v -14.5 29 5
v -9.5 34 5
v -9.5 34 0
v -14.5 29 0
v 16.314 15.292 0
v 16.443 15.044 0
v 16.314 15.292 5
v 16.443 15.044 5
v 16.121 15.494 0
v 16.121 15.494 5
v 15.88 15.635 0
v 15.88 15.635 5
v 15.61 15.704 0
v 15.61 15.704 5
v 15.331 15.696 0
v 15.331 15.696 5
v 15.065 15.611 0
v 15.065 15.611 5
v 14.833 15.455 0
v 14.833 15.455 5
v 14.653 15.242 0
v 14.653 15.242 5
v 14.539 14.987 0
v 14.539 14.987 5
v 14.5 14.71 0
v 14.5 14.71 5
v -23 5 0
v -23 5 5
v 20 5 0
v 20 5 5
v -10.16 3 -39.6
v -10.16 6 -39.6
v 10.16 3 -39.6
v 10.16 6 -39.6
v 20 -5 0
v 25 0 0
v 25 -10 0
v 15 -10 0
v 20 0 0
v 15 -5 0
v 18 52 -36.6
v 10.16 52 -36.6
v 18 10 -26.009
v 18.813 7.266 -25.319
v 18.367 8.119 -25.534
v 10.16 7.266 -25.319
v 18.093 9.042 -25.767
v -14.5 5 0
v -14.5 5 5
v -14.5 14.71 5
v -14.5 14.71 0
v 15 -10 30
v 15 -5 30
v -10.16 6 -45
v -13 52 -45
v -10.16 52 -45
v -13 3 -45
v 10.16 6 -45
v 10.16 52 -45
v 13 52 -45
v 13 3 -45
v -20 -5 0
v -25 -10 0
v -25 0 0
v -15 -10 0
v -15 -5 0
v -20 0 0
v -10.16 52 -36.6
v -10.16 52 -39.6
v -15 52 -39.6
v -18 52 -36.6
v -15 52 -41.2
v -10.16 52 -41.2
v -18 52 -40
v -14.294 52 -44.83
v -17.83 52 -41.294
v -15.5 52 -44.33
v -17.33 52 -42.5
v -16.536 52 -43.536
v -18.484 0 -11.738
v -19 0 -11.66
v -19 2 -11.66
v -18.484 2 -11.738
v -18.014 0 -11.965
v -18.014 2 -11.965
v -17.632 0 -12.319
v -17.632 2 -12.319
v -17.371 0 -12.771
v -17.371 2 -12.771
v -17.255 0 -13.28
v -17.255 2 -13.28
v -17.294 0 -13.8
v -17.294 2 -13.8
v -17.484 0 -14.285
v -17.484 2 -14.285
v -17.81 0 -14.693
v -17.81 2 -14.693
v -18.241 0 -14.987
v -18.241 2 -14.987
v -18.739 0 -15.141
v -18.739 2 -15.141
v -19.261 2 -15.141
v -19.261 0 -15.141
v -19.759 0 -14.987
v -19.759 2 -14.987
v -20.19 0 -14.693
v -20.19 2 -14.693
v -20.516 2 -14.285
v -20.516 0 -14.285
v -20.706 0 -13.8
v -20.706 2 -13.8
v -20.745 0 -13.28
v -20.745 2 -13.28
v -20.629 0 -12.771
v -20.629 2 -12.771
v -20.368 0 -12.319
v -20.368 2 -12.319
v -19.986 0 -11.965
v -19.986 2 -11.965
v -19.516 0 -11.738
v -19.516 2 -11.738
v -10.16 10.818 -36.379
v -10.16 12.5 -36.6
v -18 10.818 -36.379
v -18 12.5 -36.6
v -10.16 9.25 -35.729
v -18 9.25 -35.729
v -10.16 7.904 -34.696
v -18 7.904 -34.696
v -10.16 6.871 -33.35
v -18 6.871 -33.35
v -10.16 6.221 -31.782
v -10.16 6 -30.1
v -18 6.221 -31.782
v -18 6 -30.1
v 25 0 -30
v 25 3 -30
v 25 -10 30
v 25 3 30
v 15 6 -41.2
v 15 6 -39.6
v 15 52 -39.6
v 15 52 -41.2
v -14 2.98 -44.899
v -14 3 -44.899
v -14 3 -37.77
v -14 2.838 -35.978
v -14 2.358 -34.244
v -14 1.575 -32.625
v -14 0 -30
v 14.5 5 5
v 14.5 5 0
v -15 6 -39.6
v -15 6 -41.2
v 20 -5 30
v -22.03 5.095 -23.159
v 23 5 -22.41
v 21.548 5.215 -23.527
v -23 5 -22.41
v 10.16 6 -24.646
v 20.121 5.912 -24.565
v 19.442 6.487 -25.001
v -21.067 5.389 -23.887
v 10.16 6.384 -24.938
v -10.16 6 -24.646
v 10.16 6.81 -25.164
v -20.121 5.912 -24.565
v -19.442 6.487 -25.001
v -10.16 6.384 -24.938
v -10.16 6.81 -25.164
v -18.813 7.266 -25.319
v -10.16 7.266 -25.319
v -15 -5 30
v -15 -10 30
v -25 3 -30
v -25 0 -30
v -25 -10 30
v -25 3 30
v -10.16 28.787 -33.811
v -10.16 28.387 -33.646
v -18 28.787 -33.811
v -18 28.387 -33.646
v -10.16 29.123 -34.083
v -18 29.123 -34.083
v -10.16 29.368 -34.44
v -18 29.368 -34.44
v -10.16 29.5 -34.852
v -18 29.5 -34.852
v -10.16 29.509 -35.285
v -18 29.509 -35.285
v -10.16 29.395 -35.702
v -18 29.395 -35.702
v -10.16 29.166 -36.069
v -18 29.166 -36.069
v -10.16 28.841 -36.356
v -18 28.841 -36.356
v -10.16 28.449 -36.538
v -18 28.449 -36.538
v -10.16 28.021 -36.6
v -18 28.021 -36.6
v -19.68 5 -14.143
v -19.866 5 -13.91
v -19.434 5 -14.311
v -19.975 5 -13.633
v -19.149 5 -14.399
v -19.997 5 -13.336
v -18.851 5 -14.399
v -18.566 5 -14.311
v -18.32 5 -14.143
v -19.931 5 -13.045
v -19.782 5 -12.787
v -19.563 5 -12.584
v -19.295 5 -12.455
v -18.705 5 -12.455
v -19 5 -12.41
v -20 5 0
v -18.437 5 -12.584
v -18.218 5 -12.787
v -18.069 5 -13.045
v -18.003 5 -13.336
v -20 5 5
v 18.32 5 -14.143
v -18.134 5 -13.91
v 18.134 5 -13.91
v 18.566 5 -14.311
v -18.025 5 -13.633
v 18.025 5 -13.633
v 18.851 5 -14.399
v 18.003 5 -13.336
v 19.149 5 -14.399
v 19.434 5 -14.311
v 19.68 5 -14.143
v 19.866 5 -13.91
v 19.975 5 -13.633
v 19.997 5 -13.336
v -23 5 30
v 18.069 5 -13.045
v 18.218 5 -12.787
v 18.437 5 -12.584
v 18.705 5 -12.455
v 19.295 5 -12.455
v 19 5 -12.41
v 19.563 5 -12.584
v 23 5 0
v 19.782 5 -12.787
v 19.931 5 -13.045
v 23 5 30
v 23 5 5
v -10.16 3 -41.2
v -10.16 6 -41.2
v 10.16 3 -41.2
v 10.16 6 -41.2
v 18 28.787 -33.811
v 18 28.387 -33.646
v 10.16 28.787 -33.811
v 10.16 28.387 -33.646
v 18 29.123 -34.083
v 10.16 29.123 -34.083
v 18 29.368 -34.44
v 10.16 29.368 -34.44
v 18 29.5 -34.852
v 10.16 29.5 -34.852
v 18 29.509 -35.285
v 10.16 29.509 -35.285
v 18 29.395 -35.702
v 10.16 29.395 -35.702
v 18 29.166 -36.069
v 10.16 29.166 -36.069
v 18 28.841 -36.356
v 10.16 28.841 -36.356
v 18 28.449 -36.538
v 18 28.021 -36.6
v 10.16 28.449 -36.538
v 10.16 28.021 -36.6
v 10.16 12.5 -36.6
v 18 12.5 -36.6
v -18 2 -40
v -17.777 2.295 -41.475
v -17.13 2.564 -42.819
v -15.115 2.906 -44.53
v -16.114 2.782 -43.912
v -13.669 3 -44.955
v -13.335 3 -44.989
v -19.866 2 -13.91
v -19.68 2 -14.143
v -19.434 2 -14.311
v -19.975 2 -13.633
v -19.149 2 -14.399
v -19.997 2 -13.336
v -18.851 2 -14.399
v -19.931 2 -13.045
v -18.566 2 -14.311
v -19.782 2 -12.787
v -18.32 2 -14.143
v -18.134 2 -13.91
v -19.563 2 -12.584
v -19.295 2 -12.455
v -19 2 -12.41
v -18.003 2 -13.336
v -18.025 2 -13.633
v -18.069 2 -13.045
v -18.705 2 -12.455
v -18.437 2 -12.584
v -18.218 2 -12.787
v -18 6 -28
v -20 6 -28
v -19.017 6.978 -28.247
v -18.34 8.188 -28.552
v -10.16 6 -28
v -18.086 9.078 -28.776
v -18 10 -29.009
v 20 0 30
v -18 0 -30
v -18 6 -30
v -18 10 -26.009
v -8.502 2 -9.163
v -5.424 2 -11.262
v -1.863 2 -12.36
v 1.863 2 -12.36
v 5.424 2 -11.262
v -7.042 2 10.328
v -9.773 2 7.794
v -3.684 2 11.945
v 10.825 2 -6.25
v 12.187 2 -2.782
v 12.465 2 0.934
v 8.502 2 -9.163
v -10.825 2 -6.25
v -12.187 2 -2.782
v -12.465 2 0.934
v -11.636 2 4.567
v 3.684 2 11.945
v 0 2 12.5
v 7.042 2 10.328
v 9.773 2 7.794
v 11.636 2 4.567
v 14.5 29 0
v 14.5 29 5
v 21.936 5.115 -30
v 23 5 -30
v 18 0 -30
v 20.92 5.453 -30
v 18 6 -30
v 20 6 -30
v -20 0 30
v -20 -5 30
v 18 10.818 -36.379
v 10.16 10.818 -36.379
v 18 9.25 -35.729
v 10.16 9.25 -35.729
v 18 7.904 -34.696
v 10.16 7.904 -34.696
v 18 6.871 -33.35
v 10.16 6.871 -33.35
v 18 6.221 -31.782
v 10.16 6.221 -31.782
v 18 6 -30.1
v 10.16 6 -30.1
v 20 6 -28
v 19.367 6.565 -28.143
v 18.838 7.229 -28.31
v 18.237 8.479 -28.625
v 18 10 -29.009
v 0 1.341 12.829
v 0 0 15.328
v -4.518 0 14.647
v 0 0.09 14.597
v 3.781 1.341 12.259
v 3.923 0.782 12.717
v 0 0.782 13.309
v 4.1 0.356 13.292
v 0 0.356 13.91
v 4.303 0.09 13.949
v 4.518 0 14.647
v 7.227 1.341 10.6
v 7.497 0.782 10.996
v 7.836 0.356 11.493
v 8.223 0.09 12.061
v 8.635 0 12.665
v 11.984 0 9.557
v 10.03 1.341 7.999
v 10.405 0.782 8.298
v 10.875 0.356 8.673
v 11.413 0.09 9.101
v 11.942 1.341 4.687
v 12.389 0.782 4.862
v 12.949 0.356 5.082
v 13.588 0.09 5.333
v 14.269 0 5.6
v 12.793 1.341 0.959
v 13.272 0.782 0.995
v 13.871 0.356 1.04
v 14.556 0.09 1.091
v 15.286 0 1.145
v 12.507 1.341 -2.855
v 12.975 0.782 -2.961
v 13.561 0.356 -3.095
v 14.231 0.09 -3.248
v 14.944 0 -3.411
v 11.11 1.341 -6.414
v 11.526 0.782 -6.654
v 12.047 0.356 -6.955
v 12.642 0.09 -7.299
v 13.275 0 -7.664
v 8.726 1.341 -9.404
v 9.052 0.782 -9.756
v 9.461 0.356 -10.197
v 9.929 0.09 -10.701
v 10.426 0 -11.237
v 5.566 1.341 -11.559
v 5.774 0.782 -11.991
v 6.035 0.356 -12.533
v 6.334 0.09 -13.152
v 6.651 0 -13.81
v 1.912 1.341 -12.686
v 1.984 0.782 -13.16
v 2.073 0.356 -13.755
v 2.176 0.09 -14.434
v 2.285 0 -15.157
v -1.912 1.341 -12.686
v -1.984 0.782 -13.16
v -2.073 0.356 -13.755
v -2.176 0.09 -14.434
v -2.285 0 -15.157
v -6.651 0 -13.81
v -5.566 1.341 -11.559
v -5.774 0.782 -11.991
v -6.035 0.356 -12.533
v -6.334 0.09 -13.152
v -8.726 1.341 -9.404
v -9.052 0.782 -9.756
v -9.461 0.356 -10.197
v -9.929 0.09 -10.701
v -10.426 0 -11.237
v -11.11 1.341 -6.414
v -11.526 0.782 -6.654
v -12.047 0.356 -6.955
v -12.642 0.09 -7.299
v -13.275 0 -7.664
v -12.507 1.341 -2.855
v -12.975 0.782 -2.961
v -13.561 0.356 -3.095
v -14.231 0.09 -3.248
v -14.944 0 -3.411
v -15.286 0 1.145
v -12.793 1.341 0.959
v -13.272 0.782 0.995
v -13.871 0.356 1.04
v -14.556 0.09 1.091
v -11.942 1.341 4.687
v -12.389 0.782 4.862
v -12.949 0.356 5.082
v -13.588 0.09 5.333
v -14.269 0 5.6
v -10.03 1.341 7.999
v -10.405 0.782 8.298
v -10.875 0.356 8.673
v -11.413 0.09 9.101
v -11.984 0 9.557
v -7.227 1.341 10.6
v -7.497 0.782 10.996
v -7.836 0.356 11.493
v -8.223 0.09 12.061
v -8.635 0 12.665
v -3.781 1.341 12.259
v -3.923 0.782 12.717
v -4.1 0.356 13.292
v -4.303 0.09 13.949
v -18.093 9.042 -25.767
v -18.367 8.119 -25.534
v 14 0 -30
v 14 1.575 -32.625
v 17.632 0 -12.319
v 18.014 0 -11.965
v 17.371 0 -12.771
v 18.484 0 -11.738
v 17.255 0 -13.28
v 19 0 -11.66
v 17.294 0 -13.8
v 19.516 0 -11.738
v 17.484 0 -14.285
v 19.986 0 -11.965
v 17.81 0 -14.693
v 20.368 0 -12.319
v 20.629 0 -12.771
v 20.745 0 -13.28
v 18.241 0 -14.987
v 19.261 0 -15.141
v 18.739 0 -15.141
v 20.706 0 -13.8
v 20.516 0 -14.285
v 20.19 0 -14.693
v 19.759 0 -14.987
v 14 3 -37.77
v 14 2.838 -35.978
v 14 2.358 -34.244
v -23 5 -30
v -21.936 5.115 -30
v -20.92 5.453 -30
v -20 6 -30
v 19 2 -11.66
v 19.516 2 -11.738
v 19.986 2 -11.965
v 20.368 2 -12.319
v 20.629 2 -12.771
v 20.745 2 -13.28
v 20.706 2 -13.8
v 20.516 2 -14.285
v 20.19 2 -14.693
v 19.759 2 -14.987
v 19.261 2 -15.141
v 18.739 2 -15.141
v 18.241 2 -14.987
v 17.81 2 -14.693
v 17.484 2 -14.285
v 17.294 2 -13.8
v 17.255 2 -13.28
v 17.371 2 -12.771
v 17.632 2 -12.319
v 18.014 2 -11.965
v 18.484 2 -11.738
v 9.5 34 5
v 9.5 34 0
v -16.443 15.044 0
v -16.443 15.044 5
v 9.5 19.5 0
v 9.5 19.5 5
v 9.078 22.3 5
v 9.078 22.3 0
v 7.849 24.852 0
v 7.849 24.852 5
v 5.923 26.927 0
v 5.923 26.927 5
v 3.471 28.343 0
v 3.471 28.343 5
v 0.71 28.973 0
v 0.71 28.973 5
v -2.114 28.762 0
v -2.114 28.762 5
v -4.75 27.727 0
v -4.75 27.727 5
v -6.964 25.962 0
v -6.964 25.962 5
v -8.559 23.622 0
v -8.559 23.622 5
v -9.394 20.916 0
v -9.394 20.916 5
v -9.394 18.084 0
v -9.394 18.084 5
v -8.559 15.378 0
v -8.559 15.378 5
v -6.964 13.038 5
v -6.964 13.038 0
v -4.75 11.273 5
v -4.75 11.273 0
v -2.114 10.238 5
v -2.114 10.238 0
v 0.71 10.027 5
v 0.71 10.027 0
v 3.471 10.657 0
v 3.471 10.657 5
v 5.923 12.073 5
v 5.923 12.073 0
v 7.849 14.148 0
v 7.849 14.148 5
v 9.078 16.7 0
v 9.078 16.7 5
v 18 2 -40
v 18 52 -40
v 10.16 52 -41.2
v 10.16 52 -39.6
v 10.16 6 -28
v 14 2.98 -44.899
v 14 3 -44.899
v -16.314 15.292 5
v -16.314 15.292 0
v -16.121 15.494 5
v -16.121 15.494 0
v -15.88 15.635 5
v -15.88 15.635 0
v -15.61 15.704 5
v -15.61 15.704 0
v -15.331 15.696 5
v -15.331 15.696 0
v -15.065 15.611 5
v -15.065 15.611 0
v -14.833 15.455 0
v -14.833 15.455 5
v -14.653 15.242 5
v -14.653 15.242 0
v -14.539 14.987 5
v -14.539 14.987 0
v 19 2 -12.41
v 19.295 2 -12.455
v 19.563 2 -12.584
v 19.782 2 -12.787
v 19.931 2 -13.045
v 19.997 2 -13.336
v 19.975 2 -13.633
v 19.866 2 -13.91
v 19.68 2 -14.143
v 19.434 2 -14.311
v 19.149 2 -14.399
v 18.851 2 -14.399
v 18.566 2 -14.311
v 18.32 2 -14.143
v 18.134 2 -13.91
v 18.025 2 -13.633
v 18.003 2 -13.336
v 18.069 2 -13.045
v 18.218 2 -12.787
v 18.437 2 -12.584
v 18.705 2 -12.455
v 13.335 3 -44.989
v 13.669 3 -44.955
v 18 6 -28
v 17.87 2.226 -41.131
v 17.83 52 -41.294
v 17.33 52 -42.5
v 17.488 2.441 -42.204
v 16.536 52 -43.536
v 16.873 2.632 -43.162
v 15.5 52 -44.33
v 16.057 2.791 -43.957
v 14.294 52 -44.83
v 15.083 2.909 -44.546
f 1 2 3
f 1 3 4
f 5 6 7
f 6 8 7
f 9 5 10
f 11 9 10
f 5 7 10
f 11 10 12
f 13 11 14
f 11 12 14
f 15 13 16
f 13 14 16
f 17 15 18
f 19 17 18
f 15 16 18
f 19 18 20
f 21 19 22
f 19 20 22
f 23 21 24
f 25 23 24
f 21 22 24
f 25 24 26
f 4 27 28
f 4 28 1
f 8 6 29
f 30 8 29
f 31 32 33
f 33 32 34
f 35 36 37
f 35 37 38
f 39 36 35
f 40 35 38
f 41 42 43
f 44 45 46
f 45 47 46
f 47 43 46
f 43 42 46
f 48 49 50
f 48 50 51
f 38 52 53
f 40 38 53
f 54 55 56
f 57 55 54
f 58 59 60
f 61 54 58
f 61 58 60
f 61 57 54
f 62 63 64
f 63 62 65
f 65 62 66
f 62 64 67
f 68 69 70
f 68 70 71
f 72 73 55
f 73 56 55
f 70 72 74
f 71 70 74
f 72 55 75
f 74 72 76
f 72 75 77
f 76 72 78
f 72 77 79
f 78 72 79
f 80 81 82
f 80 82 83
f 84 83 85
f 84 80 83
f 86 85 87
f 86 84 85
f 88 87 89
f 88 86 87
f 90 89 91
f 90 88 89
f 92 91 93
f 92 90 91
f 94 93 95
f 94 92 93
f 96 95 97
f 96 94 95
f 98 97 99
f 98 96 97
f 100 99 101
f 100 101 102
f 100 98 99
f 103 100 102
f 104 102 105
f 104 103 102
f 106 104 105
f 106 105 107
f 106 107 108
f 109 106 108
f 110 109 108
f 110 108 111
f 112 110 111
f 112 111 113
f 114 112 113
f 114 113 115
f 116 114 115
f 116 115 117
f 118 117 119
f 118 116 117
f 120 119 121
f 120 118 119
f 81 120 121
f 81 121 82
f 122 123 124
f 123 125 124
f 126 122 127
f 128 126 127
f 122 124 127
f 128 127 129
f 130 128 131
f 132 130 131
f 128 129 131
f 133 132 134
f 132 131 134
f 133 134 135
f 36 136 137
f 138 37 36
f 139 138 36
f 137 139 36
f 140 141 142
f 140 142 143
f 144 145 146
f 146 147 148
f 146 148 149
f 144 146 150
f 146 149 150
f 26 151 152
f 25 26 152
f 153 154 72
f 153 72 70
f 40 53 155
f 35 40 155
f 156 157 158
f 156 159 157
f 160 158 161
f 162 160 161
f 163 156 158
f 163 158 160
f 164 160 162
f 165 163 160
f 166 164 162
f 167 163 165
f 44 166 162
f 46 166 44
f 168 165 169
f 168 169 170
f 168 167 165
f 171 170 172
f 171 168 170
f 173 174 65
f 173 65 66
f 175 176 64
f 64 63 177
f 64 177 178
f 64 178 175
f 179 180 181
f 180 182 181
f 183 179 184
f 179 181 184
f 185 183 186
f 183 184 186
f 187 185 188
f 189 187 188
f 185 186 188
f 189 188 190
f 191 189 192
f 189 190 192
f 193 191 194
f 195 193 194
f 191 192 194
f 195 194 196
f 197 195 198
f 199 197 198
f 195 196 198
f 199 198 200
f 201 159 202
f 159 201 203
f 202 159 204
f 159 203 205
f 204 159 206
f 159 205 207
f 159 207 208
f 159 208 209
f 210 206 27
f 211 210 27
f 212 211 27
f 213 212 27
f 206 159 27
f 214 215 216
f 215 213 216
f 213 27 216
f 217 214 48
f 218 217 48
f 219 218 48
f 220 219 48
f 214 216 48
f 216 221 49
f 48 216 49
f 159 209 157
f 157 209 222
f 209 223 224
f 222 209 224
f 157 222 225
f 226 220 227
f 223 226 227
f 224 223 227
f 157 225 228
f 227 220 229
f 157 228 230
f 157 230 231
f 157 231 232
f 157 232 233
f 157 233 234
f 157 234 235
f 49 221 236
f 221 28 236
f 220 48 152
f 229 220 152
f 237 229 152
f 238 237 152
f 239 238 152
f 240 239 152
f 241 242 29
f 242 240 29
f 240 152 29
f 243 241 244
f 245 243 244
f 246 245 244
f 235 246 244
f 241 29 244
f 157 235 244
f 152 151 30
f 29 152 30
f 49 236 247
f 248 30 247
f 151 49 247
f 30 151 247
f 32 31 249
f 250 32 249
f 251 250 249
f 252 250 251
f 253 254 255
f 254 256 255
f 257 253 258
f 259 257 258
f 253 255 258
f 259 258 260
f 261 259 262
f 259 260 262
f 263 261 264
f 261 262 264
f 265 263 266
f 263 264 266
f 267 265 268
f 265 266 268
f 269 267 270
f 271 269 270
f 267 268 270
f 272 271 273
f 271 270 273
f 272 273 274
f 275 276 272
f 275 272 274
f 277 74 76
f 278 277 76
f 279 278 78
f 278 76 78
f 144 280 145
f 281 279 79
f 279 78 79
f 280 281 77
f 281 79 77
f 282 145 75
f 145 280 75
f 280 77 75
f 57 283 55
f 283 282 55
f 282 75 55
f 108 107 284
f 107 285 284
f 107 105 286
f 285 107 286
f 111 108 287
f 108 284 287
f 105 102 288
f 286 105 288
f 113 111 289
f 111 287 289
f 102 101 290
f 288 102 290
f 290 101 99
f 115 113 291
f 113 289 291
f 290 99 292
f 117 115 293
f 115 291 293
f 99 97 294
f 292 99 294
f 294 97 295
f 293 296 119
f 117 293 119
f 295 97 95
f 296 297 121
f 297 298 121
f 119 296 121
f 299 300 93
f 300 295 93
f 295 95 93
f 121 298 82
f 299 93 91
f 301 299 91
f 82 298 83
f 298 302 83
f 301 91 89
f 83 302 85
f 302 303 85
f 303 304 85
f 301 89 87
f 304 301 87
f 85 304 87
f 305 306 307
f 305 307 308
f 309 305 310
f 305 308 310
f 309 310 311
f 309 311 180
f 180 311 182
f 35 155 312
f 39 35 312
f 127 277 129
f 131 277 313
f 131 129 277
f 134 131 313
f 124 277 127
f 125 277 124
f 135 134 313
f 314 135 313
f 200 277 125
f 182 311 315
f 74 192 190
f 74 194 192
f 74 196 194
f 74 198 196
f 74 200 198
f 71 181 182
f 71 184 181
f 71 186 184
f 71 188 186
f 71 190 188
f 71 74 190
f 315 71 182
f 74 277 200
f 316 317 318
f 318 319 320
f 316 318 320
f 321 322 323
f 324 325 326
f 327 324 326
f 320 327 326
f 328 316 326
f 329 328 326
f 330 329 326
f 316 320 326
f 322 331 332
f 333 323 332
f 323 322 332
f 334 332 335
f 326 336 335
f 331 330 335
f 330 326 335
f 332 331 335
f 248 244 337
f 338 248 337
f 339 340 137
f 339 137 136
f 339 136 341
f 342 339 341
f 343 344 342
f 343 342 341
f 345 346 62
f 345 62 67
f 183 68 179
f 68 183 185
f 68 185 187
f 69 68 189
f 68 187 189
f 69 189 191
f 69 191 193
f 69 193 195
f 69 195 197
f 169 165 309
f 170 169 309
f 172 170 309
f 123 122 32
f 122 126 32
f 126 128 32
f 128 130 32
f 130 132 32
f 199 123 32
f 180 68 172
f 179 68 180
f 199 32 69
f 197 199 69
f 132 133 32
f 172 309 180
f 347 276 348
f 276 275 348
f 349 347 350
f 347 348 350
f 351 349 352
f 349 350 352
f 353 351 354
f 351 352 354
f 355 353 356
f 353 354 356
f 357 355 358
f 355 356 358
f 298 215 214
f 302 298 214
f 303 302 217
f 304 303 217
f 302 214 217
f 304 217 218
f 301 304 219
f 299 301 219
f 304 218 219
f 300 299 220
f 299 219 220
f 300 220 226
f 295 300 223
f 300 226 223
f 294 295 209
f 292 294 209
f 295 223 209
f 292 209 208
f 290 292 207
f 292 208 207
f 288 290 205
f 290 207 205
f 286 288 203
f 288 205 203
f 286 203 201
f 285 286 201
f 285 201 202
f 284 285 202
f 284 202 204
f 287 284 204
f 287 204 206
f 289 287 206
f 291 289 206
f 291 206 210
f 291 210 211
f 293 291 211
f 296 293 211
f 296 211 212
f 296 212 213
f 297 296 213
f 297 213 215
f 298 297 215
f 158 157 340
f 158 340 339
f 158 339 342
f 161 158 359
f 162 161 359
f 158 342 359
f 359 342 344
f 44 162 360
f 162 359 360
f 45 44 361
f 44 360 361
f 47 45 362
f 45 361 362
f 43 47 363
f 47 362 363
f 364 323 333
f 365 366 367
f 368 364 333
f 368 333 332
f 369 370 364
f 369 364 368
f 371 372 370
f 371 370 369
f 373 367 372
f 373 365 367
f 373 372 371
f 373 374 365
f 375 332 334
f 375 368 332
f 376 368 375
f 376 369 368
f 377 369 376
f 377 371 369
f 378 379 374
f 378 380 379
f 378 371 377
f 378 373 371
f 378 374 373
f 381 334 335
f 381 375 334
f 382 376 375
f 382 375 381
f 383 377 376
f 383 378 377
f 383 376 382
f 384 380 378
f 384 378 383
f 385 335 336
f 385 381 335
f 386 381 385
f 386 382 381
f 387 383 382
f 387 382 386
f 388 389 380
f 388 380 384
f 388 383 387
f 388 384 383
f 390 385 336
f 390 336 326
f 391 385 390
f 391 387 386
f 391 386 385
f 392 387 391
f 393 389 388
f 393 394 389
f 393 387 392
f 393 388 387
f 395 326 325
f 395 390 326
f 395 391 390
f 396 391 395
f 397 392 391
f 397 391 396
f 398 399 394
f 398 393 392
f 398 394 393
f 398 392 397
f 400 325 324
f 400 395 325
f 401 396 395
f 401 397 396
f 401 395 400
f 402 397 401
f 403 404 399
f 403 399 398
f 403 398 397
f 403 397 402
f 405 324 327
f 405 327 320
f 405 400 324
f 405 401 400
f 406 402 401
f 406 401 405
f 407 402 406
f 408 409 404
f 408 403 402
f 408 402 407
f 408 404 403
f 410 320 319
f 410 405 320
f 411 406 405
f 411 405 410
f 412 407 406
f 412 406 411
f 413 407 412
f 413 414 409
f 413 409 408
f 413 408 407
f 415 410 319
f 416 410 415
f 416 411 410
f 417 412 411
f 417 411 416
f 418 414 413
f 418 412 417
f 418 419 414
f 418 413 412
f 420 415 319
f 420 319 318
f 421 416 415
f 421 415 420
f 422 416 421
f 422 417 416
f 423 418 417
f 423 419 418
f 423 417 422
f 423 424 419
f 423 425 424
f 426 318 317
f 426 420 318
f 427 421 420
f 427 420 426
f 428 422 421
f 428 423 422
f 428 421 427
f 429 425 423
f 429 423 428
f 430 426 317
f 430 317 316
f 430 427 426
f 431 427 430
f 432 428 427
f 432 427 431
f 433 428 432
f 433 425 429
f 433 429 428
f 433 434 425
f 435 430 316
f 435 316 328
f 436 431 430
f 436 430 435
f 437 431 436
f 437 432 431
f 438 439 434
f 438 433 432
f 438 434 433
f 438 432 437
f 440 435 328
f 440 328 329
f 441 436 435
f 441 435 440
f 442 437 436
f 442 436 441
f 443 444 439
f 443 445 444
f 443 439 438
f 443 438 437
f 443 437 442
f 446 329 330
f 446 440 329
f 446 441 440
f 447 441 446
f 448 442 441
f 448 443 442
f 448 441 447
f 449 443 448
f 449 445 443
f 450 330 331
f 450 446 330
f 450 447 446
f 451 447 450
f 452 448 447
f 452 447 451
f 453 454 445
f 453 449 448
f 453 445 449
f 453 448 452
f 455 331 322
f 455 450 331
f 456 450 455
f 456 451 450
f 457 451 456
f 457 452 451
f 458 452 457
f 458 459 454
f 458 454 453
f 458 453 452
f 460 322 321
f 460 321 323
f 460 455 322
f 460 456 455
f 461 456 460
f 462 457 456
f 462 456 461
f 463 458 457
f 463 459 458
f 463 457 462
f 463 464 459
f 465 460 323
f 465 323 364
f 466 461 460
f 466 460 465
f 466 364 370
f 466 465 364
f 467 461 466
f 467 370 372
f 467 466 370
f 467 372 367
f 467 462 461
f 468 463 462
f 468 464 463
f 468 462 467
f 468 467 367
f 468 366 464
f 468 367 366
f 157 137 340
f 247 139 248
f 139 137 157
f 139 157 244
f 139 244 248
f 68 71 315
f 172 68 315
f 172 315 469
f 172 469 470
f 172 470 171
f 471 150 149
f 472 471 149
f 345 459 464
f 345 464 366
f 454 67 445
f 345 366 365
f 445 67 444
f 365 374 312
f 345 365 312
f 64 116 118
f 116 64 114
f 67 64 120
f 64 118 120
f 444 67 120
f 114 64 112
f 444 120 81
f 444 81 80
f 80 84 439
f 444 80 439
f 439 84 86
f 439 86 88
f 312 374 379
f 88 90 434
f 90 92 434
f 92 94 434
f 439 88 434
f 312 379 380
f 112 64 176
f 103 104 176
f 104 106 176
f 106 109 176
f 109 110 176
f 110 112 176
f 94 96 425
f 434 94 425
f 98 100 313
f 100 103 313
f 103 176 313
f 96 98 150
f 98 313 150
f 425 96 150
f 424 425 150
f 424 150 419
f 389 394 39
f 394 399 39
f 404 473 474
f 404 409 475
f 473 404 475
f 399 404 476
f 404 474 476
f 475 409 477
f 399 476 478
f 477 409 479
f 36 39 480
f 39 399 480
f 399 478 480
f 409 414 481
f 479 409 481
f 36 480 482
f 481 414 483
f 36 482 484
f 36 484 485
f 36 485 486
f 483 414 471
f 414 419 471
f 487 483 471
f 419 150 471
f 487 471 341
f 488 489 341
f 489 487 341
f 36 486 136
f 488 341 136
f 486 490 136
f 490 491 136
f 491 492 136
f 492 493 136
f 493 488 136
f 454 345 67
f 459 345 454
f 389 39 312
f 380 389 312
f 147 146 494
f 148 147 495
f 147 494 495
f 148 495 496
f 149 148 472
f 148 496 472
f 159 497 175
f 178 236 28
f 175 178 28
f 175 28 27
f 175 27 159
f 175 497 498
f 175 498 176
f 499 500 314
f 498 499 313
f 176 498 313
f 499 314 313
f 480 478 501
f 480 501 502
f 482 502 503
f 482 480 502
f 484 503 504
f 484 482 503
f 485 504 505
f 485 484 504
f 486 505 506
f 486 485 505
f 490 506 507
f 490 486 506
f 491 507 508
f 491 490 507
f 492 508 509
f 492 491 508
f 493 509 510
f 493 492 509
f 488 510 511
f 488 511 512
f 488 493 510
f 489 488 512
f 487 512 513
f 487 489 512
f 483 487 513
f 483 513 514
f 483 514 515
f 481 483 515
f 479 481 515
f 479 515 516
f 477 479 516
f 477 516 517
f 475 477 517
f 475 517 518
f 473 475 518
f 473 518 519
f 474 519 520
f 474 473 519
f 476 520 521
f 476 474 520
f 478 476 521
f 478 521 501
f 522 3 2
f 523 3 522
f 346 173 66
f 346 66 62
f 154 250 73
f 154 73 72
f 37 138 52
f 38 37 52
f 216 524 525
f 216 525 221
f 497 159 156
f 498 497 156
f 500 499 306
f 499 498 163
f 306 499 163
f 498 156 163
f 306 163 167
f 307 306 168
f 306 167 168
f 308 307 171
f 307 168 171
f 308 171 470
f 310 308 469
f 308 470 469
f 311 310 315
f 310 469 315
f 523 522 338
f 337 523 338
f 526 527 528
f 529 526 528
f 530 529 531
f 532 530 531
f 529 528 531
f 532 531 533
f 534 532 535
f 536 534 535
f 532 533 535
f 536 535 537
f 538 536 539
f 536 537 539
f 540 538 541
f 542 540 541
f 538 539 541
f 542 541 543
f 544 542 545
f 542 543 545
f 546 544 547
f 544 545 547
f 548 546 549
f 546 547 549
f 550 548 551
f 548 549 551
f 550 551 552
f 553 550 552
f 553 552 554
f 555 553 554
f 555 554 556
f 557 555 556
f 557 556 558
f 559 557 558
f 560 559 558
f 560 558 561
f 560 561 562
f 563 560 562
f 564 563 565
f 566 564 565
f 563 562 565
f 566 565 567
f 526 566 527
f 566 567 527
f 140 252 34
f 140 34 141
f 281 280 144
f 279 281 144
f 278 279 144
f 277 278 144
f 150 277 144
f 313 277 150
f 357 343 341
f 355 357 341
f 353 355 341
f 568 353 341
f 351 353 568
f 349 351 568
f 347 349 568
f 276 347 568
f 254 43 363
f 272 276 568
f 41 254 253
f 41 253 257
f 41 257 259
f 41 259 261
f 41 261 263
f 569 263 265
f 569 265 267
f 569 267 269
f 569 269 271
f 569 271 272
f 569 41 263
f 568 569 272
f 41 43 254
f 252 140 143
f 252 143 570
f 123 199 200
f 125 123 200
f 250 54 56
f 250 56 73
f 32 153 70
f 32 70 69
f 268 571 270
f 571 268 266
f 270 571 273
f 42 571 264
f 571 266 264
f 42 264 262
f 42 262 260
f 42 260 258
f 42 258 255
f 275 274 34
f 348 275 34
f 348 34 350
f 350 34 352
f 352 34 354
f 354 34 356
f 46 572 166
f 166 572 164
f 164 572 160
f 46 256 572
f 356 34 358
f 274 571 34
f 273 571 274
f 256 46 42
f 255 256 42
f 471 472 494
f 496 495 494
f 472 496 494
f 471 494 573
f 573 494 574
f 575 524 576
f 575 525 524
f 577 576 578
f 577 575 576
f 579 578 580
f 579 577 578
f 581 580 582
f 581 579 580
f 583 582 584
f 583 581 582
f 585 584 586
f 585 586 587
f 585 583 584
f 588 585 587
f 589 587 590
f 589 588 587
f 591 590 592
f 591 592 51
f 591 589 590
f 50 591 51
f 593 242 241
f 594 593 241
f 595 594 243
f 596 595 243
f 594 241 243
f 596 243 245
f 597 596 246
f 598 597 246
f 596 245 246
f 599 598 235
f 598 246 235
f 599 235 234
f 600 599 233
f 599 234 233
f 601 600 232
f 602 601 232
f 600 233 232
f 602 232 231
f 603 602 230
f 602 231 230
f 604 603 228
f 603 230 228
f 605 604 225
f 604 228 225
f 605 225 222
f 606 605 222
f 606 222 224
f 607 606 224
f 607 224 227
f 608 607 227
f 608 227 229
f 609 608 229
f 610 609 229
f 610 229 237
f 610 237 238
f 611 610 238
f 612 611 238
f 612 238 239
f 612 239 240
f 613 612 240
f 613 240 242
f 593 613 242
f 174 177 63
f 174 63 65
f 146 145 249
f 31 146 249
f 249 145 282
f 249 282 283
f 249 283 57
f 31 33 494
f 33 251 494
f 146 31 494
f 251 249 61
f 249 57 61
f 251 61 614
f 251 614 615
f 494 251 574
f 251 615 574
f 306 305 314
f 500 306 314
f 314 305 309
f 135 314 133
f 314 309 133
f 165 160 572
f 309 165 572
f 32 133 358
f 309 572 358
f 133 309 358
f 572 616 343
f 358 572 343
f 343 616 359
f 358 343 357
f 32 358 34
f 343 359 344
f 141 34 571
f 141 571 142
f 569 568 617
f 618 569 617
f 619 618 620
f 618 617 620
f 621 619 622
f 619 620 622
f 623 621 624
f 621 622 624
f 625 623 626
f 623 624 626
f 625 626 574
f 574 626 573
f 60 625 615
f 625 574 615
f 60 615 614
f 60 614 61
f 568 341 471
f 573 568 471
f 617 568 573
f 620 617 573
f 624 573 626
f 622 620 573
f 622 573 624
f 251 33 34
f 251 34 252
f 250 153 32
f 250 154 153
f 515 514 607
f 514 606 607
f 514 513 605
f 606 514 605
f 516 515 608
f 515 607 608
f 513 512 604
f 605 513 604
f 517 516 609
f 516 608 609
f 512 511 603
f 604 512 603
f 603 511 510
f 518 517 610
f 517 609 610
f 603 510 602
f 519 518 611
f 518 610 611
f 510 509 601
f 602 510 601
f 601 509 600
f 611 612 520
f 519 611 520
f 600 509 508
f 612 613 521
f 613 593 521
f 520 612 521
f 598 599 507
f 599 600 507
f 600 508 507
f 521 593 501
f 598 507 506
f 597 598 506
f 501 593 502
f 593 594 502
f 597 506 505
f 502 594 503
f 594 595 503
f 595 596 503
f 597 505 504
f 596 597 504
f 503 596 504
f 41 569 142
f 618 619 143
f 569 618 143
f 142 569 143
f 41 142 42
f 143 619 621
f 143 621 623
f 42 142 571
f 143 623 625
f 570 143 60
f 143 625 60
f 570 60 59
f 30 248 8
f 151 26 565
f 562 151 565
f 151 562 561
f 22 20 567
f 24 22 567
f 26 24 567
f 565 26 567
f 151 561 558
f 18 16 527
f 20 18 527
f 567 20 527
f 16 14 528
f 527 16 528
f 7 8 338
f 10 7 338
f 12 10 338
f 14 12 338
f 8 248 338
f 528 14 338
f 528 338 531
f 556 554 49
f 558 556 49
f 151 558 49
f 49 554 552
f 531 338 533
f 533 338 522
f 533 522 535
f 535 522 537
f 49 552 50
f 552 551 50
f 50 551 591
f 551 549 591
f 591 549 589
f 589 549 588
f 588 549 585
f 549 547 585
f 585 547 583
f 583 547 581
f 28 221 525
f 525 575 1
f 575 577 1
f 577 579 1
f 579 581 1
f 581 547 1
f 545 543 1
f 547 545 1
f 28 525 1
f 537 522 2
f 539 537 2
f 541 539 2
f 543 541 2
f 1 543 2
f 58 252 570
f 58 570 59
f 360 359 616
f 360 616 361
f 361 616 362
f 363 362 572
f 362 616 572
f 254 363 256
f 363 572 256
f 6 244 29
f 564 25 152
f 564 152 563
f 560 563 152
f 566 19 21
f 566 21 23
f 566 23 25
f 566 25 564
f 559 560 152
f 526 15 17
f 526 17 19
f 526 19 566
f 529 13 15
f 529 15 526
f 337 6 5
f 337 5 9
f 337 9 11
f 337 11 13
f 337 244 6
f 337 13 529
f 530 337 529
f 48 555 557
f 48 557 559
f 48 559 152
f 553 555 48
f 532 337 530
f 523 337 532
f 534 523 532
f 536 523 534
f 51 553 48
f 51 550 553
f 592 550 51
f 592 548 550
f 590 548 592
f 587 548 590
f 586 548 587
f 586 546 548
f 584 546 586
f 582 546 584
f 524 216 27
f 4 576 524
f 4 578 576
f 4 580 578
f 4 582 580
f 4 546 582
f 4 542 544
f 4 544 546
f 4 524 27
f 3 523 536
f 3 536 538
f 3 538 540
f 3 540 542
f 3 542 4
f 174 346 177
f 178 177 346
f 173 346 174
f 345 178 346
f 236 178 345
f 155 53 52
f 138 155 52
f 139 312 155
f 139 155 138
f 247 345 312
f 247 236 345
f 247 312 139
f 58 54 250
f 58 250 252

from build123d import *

# Parameters (mm, degrees)
SKETCH_2_W           = 60
SKETCH_2_H           = 60
EXTRUDE_1_DEPTH      = 3
EXTRUDE_START        = 30
EXTRUDE_3_DEPTH      = 30
EXTRUDE_START_2      = 3
SKETCH_8_W           = 36
SKETCH_8_H           = 20
EXTRUDE_4_DEPTH      = 3
CUT_EXTRUDE_START    = 6
SKETCH_10_W          = 20.32
SKETCH_10_H          = 1.6
CUT_EXTRUDE_2_DEPTH  = 3
EXTRUDE_START_3      = 6
EXTRUDE_5_DEPTH      = 46
EXTRUDE_START_4      = -18
EXTRUDE_6_DEPTH      = 36
EXTRUDE_START_5      = 18
EXTRUDE_8_DEPTH      = 7.84
EXTRUDE_START_6      = -10.16
EXTRUDE_9_DEPTH      = 7.84
EXTRUDE_10_DEPTH     = 36
SKETCH_16_W          = 5
SKETCH_16_H          = 60
CUT_EXTRUDE_3_DEPTH  = 3
EXTRUDE_11_DEPTH     = 4
EXTRUDE_12_DEPTH     = 4
FILLET_3_R           = 5
FILLET_4_R           = 10
SKETCH_22_W          = 50
SKETCH_22_H          = 2
EXTRUDE_14_DEPTH     = 60
CUT_EXTRUDE_START_2  = 30
CUT_EXTRUDE_4_DEPTH  = 60
SKETCH_26_R          = 12.5
CUT_EXTRUDE_6_DEPTH  = 2
FILLET_5_R           = 3
FILLET_7_R           = 5
FILLET_8_R           = 6.5
FILLET_9_R           = 1.5
FILLET_10_R          = 3
EXTRUDE_START_7      = 5
SKETCH_27_W          = 29
SKETCH_27_H          = 5
EXTRUDE_15_DEPTH     = 29
CUT_EXTRUDE_START_3  = 5
SKETCH_28_R          = 9.5
CUT_EXTRUDE_7_DEPTH  = 5
CUT_EXTRUDE_8_DEPTH  = 5
EXTRUDE_16_DEPTH     = 5
FILLET_11_R          = 1
SKETCH_31_R          = 1
CUT_EXTRUDE_9_DEPTH  = 5
SKETCH_32_R          = 1.75
CUT_EXTRUDE_10_DEPTH = 2


with BuildPart() as part:
    # 草图2 → 凸台-拉伸1 (new body)
    with BuildSketch(Plane(origin=(0, 0, 0), x_dir=(1, 0, 0), z_dir=(0, 1, 0))):
        Rectangle(SKETCH_2_W, SKETCH_2_H)
    extrude(amount=EXTRUDE_1_DEPTH)

    # 草图7 → 凸台-拉伸3 (add)
    with BuildSketch(Plane.XY.offset(EXTRUDE_START)):
        Polygon((-25, 0), (-25, -10), (-15, -10), (-15, -5), (-20, -5), (-20, 0), align=None)
        Polygon((20, 0), (25, 0), (25, -10), (15, -10), (15, -5), (20, -5), align=None)
    extrude(amount=-EXTRUDE_3_DEPTH)

    # 草图8 → 凸台-拉伸4 (add)
    with BuildSketch(Plane(origin=(0, 0, 0), x_dir=(1, 0, 0), z_dir=(0, 1, 0)).offset(EXTRUDE_START_2)):
        with Locations((0, 35)):
            Rectangle(SKETCH_8_W, SKETCH_8_H)
    extrude(amount=EXTRUDE_4_DEPTH)

    # 草图10 → 切除-拉伸2 (cut)
    with BuildSketch(Plane(origin=(0, 0, 0), x_dir=(1, 0, 0), z_dir=(0, 1, 0)).offset(CUT_EXTRUDE_START)):
        with Locations((0, 40.4)):
            Rectangle(SKETCH_10_W, SKETCH_10_H)
    extrude(amount=-CUT_EXTRUDE_2_DEPTH, mode=Mode.SUBTRACT)

    # 草图11 → 凸台-拉伸5 (add)
    with BuildSketch(Plane(origin=(0, 0, 0), x_dir=(1, 0, 0), z_dir=(0, 1, 0)).offset(EXTRUDE_START_3)):
        Polygon((10.16, 41.2), (10.16, 45), (18, 45), (18, 36.6), (10.16, 36.6), (10.16, 39.6), (15, 39.6), (15, 41.2), align=None)
        Polygon((-15, 41.2), (-15, 39.6), (-10.16, 39.6), (-10.16, 36.6), (-18, 36.6), (-18, 45), (-10.16, 45), (-10.16, 41.2), align=None)
    extrude(amount=EXTRUDE_5_DEPTH)

    # 草图12 → 凸台-拉伸6 (add)
    with BuildSketch(Plane(origin=(0, 0, 0), x_dir=(0, 0, -1), z_dir=(1, 0, 0)).offset(EXTRUDE_START_4)):
        Polygon((30, 0), (35, 3), (30, 3), align=None)
    extrude(amount=EXTRUDE_6_DEPTH)

    # 草图13 → 凸台-拉伸8 (add)
    with BuildSketch(Plane(origin=(0, 0, 0), x_dir=(0, 0, -1), z_dir=(1, 0, 0)).offset(EXTRUDE_START_5)):
        Polygon((25, 6), (36.6, 52), (36.6, 40.103448276), (28, 6), align=None)
    extrude(amount=-EXTRUDE_8_DEPTH)

    # 草图14 → 凸台-拉伸9 (add)
    with BuildSketch(Plane(origin=(0, 0, 0), x_dir=(0, 0, -1), z_dir=(1, 0, 0)).offset(EXTRUDE_START_6)):
        Polygon((36.6, 52), (25, 6), (28, 6), (36.6, 40.103448276), align=None)
    extrude(amount=-EXTRUDE_9_DEPTH)

    # 草图15 → 凸台-拉伸10 (add)
    with BuildSketch(Plane(origin=(0, 0, 0), x_dir=(0, 0, -1), z_dir=(1, 0, 0)).offset(EXTRUDE_START_4)):
        Polygon((25, 3), (24.243478261, 3), (25, 6), align=None)
    extrude(amount=EXTRUDE_10_DEPTH)

    # 草图16 → 切除-拉伸3 (cut)
    with BuildSketch(Plane(origin=(0, 0, 0), x_dir=(1, 0, 0), z_dir=(0, 1, 0))):
        with Locations((27.5, 0)):
            Rectangle(SKETCH_16_W, SKETCH_16_H)
        with Locations((-27.5, 0)):
            Rectangle(SKETCH_16_W, SKETCH_16_H)
    extrude(amount=CUT_EXTRUDE_3_DEPTH, mode=Mode.SUBTRACT)

    # 草图17 → 凸台-拉伸11 (add)
    with BuildSketch(Plane(origin=(0, 0, 0), x_dir=(0, 0, -1), z_dir=(1, 0, 0)).offset(EXTRUDE_START_5)):
        Polygon((30, 0), (45, 3), (30, 3), align=None)
    extrude(amount=-EXTRUDE_11_DEPTH)

    # 草图18 → 凸台-拉伸12 (add)
    with BuildSketch(Plane(origin=(0, 0, 0), x_dir=(0, 0, -1), z_dir=(1, 0, 0)).offset(EXTRUDE_START_4)):
        Polygon((30, 0), (30, 3), (45, 3), align=None)
    extrude(amount=EXTRUDE_12_DEPTH)

    # 圆角3
    # the kernel refuses this fillet: 5 mm, written as the material it takes off along each edge
    with BuildSketch(Plane(origin=(18, -9.5, -45), x_dir=(0, 0, 1), z_dir=(0, 1, 0)), Plane(origin=(-18, 64.5, -45), x_dir=(0, 0, 1), z_dir=(0, -1, 0))) as fillet_3_piece_1:
        with BuildLine():
            CenterArc((FILLET_3_R, -FILLET_3_R), FILLET_3_R, 90, 90)
            Line((0, -FILLET_3_R), (0, 0))
            Line((0, 0), (FILLET_3_R, 0))
        make_face()
    extrude(amount=74, mode=Mode.SUBTRACT)

    # 圆角4
    fillet_4_edges = [part.edges().sort_by_distance(p)[0] for p in [
        (0, 3, -35),
    ]]
    fillet(fillet_4_edges, radius=FILLET_4_R)

    # 草图22 → 凸台-拉伸14 (add)
    with BuildSketch(Plane.XY.offset(EXTRUDE_START)):
        with Locations((0, 4)):
            Rectangle(SKETCH_22_W, SKETCH_22_H)
    extrude(amount=-EXTRUDE_14_DEPTH)

    # 草图24 → 切除-拉伸4 (cut)
    with BuildSketch(Plane.XY.offset(CUT_EXTRUDE_START_2)):
        Polygon((-25, 5), (-23, 5), (-25, 3), align=None)
        Polygon((25, 5), (25, 3), (23, 5), align=None)
    extrude(amount=-CUT_EXTRUDE_4_DEPTH, mode=Mode.SUBTRACT)

    # 草图26 → 切除-拉伸6 (cut)
    with BuildSketch(Plane(origin=(0, 0, 0), x_dir=(1, 0, 0), z_dir=(0, 1, 0))):
        with Locations(Location((0, 0, 0), (0, 0, 270))):
            Circle(SKETCH_26_R)
    extrude(amount=CUT_EXTRUDE_6_DEPTH, mode=Mode.SUBTRACT)

    # 圆角5
    # the kernel refuses this fillet: 3 mm, written as the material it takes off along each edge
    with BuildSketch(Plane(origin=(0, 0, 0), x_dir=(0, 0, 1), z_dir=(-1, 0, 0))) as fillet_5_piece_1:
        with BuildLine():
            CenterArc((15.328427125, 3), FILLET_5_R, 199.471220634, 70.528779366)
            Line((12.5, 2), (12.443431458, 1.98))
            ThreePointArc((12.443431458, 1.98), (12.44, 1), (12.44, 0))
            Line((12.44, 0), (12.5, -0.06))
            Line((12.5, -0.06), (15.328427125, -0.06))
            Line((15.328427125, -0.06), (15.328427125, 0))
        make_face()
    revolve(axis=Axis((0, 0, 0), (0, 1, 0)), mode=Mode.SUBTRACT)

    # 圆角7
    # the kernel refuses this fillet: 5 mm, written as the material it adds along each edge
    with BuildSketch(Plane(origin=(-18, 5, -12.247826087), x_dir=(0, 1, 0), z_dir=(0, 0, -1))) as fillet_7_piece_1_section:
        with BuildLine():
            CenterArc((FILLET_7_R, -FILLET_7_R), FILLET_7_R, 90, 90)
            Line((0, -FILLET_7_R), (0, 0))
            Line((0, 0), (FILLET_7_R, 0))
        make_face()
    fillet_7_piece_1 = extrude(amount=30.252173913, mode=Mode.PRIVATE)
    fillet_7_piece_1 = split(fillet_7_piece_1, bisect_by=Plane(origin=(-18.571810287, 7.311264389, -25.330666672), z_dir=(0, -0.24451904524274018, -0.9696444897556934)), keep=Keep.TOP, mode=Mode.PRIVATE)
    fillet_7_piece_1 = split(fillet_7_piece_1, bisect_by=Plane(origin=(-18.571810287, 6.599974755, -28.151297982), z_dir=(0, 0.24451904524274015, 0.9696444897556934)), keep=Keep.TOP, mode=Mode.PRIVATE)
    add(fillet_7_piece_1)
    with BuildSketch(Plane(origin=(-18, 5, -12.247826087), x_dir=(0, 1, 0), z_dir=(0, 0, -1))) as fillet_7_piece_2_section:
        with BuildLine():
            CenterArc((FILLET_7_R, -FILLET_7_R), FILLET_7_R, 90, 90)
            Line((0, -FILLET_7_R), (0, 0))
            Line((0, 0), (FILLET_7_R, 0))
        make_face()
    fillet_7_piece_2 = extrude(amount=17.752173913, mode=Mode.PRIVATE)
    fillet_7_piece_2 = split(fillet_7_piece_2, bisect_by=Plane(origin=(-19.572975188, 6, -28.927333211), z_dir=(0, -1, 0)), keep=Keep.TOP, mode=Mode.PRIVATE)
    fillet_7_piece_2 = split(fillet_7_piece_2, bisect_by=Plane(origin=(-19.572975188, 5.678002788, -27.918800703), z_dir=(0, -0.24451904524274015, -0.9696444897556934)), keep=Keep.TOP, mode=Mode.PRIVATE)
    add(fillet_7_piece_2)
    with BuildSketch(Plane(origin=(18, 5, -30), x_dir=(1, 0, 0), z_dir=(0, 0, 1))) as fillet_7_piece_3_section:
        with BuildLine():
            CenterArc((FILLET_7_R, FILLET_7_R), FILLET_7_R, 180, 90)
            Line((0, FILLET_7_R), (0, 0))
            Line((0, 0), (FILLET_7_R, 0))
        make_face()
    fillet_7_piece_3 = extrude(amount=17.752173913, mode=Mode.PRIVATE)
    fillet_7_piece_3 = split(fillet_7_piece_3, bisect_by=Plane(origin=(19.572975189, 6, -28.92733321), z_dir=(0, -1, 0)), keep=Keep.TOP, mode=Mode.PRIVATE)
    fillet_7_piece_3 = split(fillet_7_piece_3, bisect_by=Plane(origin=(19.572975189, 6.389292423, -25.098169394), z_dir=(0, -0.24451904524274018, -0.9696444897556934)), keep=Keep.TOP, mode=Mode.PRIVATE)
    add(fillet_7_piece_3)
    with BuildSketch(Plane(origin=(18, 5, -42.5), x_dir=(1, 0, 0), z_dir=(0, 0, 1))) as fillet_7_piece_4_section:
        with BuildLine():
            CenterArc((FILLET_7_R, FILLET_7_R), FILLET_7_R, 180, 90)
            Line((0, FILLET_7_R), (0, 0))
            Line((0, 0), (FILLET_7_R, 0))
        make_face()
    fillet_7_piece_4 = extrude(amount=30.252173913, mode=Mode.PRIVATE)
    fillet_7_piece_4 = split(fillet_7_piece_4, bisect_by=Plane(origin=(18.571810287, 7.311264389, -25.330666672), z_dir=(0, -0.24451904524274018, -0.9696444897556934)), keep=Keep.TOP, mode=Mode.PRIVATE)
    fillet_7_piece_4 = split(fillet_7_piece_4, bisect_by=Plane(origin=(18.571810287, 6.599974754, -28.151297982), z_dir=(0, 0.24451904524274015, 0.9696444897556934)), keep=Keep.TOP, mode=Mode.PRIVATE)
    add(fillet_7_piece_4)

    # 圆角8
    fillet_8_edges = [part.edges().sort_by_distance(p)[0] for p in [
        (14.08, 6, -36.6),
        (-14.08, 6, -36.6),
    ]]
    fillet(fillet_8_edges, radius=FILLET_8_R)

    # 圆角9
    fillet_9_edges = [part.edges().sort_by_distance(p)[0] for p in [
        (14.08, 40.103448276, -36.6),
        (-14.08, 40.103448276, -36.6),
    ]]
    fillet(fillet_9_edges, radius=FILLET_9_R)

    # 圆角10
    # the kernel refuses this fillet: 3 mm, written as the material it adds along each edge
    with BuildSketch(Plane(origin=(-28.843489259, 5, -24.747826087), x_dir=(-2.8138525512499648e-15, 0.9696444897556498, -0.24451904524291254), z_dir=(1, 0, 0))) as fillet_10_piece_1_section:
        with BuildLine():
            CenterArc((FILLET_10_R * 0.779131901165, FILLET_10_R), FILLET_10_R, 194.153412588, 75.846587412)
            Line((-FILLET_10_R * 0.190512588591, FILLET_10_R * 0.755480954757), (0, 0))
            Line((0, 0), (FILLET_10_R * 0.779131901165, 0))
        make_face()
    fillet_10_piece_1 = extrude(amount=57.686978517, mode=Mode.PRIVATE)
    fillet_10_piece_1 = split(fillet_10_piece_1, bisect_by=Plane(origin=(-15.866529779, 6, -24.192724601), z_dir=(0, -1, 0)), keep=Keep.TOP, mode=Mode.PRIVATE)
    fillet_10_piece_1 = fillet_10_piece_1 - Plane(origin=(-23, 10, -24.192724601), x_dir=(0, 1, 0), z_dir=(0, 0, 1)) * Cylinder(5, 125, mode=Mode.PRIVATE)
    fillet_10_piece_1 = split(fillet_10_piece_1, bisect_by=Plane(origin=(-10.16, 5.299241574, -24.192724601), z_dir=(-1, 0, 0)), keep=Keep.TOP, mode=Mode.PRIVATE)
    fillet_10_piece_1 = split(fillet_10_piece_1, bisect_by=Plane(origin=(-19.283644102, 8.716355898, -24.192724601), z_dir=(0.7071067811865488, -0.7071067811865462, 0)), keep=Keep.TOP, mode=Mode.PRIVATE)
    add(fillet_10_piece_1)
    with BuildSketch(Plane(origin=(-28.843489259, 5, -24.747826087), x_dir=(-2.8138525512499648e-15, 0.9696444897556498, -0.24451904524291254), z_dir=(1, 0, 0))) as fillet_10_piece_2_section:
        with BuildLine():
            CenterArc((FILLET_10_R * 0.779131901165, FILLET_10_R), FILLET_10_R, 194.153412588, 75.846587412)
            Line((-FILLET_10_R * 0.190512588591, FILLET_10_R * 0.755480954757), (0, 0))
            Line((0, 0), (FILLET_10_R * 0.779131901165, 0))
        make_face()
    fillet_10_piece_2 = extrude(amount=57.686978517, mode=Mode.PRIVATE)
    fillet_10_piece_2 = split(fillet_10_piece_2, bisect_by=Plane(origin=(-14.854595225, 6, -25.046116775), z_dir=(0, 1, 0)), keep=Keep.TOP, mode=Mode.PRIVATE)
    fillet_10_piece_2 = fillet_10_piece_2 - Plane(origin=(-23, 10, -25.046116775), x_dir=(0, 1, 0), z_dir=(0, 0, 1)) * Cylinder(5, 125, mode=Mode.PRIVATE)
    fillet_10_piece_2 = split(fillet_10_piece_2, bisect_by=Plane(origin=(-10.16, 6.410540932, -25.046116775), z_dir=(-1, 0, 0)), keep=Keep.TOP, mode=Mode.PRIVATE)
    fillet_10_piece_2 = split(fillet_10_piece_2, bisect_by=Plane(origin=(-18.222027147, 9.777972853, -25.046116775), z_dir=(0.7071067811865488, -0.7071067811865462, 0)), keep=Keep.TOP, mode=Mode.PRIVATE)
    add(fillet_10_piece_2)
    with BuildSketch(Plane(origin=(-28.843489259, 5, -24.747826087), x_dir=(-2.8138525512499648e-15, 0.9696444897556498, -0.24451904524291254), z_dir=(1, 0, 0))) as fillet_10_piece_3_section:
        with BuildLine():
            CenterArc((FILLET_10_R * 0.779131901165, FILLET_10_R), FILLET_10_R, 194.153412588, 75.846587412)
            Line((-FILLET_10_R * 0.190512588591, FILLET_10_R * 0.755480954757), (0, 0))
            Line((0, 0), (FILLET_10_R * 0.779131901165, 0))
        make_face()
    fillet_10_piece_3 = extrude(amount=57.686978517, mode=Mode.PRIVATE)
    fillet_10_piece_3 = split(fillet_10_piece_3, bisect_by=Plane(origin=(0, 6, -24.222418931), z_dir=(0, -1, 0)), keep=Keep.TOP, mode=Mode.PRIVATE)
    fillet_10_piece_3 = split(fillet_10_piece_3, bisect_by=Plane(origin=(-10.16, 5.321349944, -24.222418931), z_dir=(1, 0, 0)), keep=Keep.TOP, mode=Mode.PRIVATE)
    fillet_10_piece_3 = split(fillet_10_piece_3, bisect_by=Plane(origin=(10.16, 5.321349944, -24.222418931), z_dir=(-1, 0, 0)), keep=Keep.TOP, mode=Mode.PRIVATE)
    add(fillet_10_piece_3)
    with BuildSketch(Plane(origin=(-28.843489259, 5, -24.747826087), x_dir=(-2.8138525512499648e-15, 0.9696444897556498, -0.24451904524291254), z_dir=(1, 0, 0))) as fillet_10_piece_4_section:
        with BuildLine():
            CenterArc((FILLET_10_R * 0.779131901165, FILLET_10_R), FILLET_10_R, 194.153412588, 75.846587412)
            Line((-FILLET_10_R * 0.190512588591, FILLET_10_R * 0.755480954757), (0, 0))
            Line((0, 0), (FILLET_10_R * 0.779131901165, 0))
        make_face()
    fillet_10_piece_4 = extrude(amount=57.686978517, mode=Mode.PRIVATE)
    fillet_10_piece_4 = split(fillet_10_piece_4, bisect_by=Plane(origin=(15.866529778, 6, -24.192724601), z_dir=(0, -1, 0)), keep=Keep.TOP, mode=Mode.PRIVATE)
    fillet_10_piece_4 = fillet_10_piece_4 - Plane(origin=(23, 10, -24.192724601), x_dir=(1, 0, 0), z_dir=(0, 0, -1)) * Cylinder(5, 125, mode=Mode.PRIVATE)
    fillet_10_piece_4 = split(fillet_10_piece_4, bisect_by=Plane(origin=(10.16, 5.299241574, -24.192724601), z_dir=(1, 0, 0)), keep=Keep.TOP, mode=Mode.PRIVATE)
    fillet_10_piece_4 = split(fillet_10_piece_4, bisect_by=Plane(origin=(19.283644102, 8.716355898, -24.192724601), z_dir=(-0.7071067811865306, -0.7071067811865644, 0)), keep=Keep.TOP, mode=Mode.PRIVATE)
    add(fillet_10_piece_4)
    with BuildSketch(Plane(origin=(-28.843489259, 5, -24.747826087), x_dir=(-2.8138525512499648e-15, 0.9696444897556498, -0.24451904524291254), z_dir=(1, 0, 0))) as fillet_10_piece_5_section:
        with BuildLine():
            CenterArc((FILLET_10_R * 0.779131901165, FILLET_10_R), FILLET_10_R, 194.153412588, 75.846587412)
            Line((-FILLET_10_R * 0.190512588591, FILLET_10_R * 0.755480954757), (0, 0))
            Line((0, 0), (FILLET_10_R * 0.779131901165, 0))
        make_face()
    fillet_10_piece_5 = extrude(amount=57.686978517, mode=Mode.PRIVATE)
    fillet_10_piece_5 = split(fillet_10_piece_5, bisect_by=Plane(origin=(14.854595225, 6, -25.046116775), z_dir=(0, 1, 0)), keep=Keep.TOP, mode=Mode.PRIVATE)
    fillet_10_piece_5 = fillet_10_piece_5 - Plane(origin=(23, 10, -25.046116775), x_dir=(1, 0, 0), z_dir=(0, 0, -1)) * Cylinder(5, 125, mode=Mode.PRIVATE)
    fillet_10_piece_5 = split(fillet_10_piece_5, bisect_by=Plane(origin=(10.16, 6.410540932, -25.046116775), z_dir=(1, 0, 0)), keep=Keep.TOP, mode=Mode.PRIVATE)
    fillet_10_piece_5 = split(fillet_10_piece_5, bisect_by=Plane(origin=(18.222027147, 9.777972853, -25.046116775), z_dir=(-0.7071067811865306, -0.7071067811865644, 0)), keep=Keep.TOP, mode=Mode.PRIVATE)
    add(fillet_10_piece_5)

    # 草图27 → 凸台-拉伸15 (add)
    with BuildSketch(Plane(origin=(0, 0, 0), x_dir=(1, 0, 0), z_dir=(0, 1, 0)).offset(EXTRUDE_START_7)):
        with Locations((0, -2.5)):
            Rectangle(SKETCH_27_W, SKETCH_27_H)
    extrude(amount=EXTRUDE_15_DEPTH)

    # 草图28 → 切除-拉伸7 (cut)
    with BuildSketch(Plane.XY.offset(CUT_EXTRUDE_START_3)):
        with Locations((0, 19.5)):
            Circle(SKETCH_28_R)
    extrude(amount=-CUT_EXTRUDE_7_DEPTH, mode=Mode.SUBTRACT)

    # 草图29 → 切除-拉伸8 (cut)
    with BuildSketch(Plane.XY.offset(CUT_EXTRUDE_START_3)):
        Polygon((-14.5, 34), (-9.5, 34), (-14.5, 29), align=None)
        Polygon((14.5, 34), (9.5, 34), (14.5, 29), align=None)
    extrude(amount=-CUT_EXTRUDE_8_DEPTH, mode=Mode.SUBTRACT)

    # 草图30 → 凸台-拉伸16 (add)
    with BuildSketch(Plane.XY):
        Polygon((-23, 5), (-14.5, 29), (-14.5, 20.529411765), (-20, 5), align=None)
        Polygon((20, 5), (23, 5), (14.5, 29), (14.5, 20.529411765), align=None)
    extrude(amount=EXTRUDE_16_DEPTH)

    # 圆角11
    fillet_11_edges = [part.edges().sort_by_distance(p)[0] for p in [
        (-14.5, 20.529411765, 2.5),
        (14.5, 20.529411765, 2.5),
    ]]
    fillet(fillet_11_edges, radius=FILLET_11_R)

    # 草图31 → 切除-拉伸9 (cut)
    with BuildSketch(Plane(origin=(0, 0, 0), x_dir=(1, 0, 0), z_dir=(0, 1, 0)).offset(CUT_EXTRUDE_START_3)):
        with Locations(Location((-19, 13.410430383, 0), (0, 0, 270))):
            Circle(SKETCH_31_R)
        with Locations(Location((19, 13.410430383, 0), (0, 0, 270))):
            Circle(SKETCH_31_R)
    extrude(amount=-CUT_EXTRUDE_9_DEPTH, mode=Mode.SUBTRACT)

    # 草图32 → 切除-拉伸10 (cut)
    with BuildSketch(Plane(origin=(0, 0, 0), x_dir=(1, 0, 0), z_dir=(0, 1, 0))):
        with Locations(Location((19, 13.410430383, 0), (0, 0, 270))):
            Circle(SKETCH_32_R)
        with Locations(Location((-19, 13.410430383, 0), (0, 0, 270))):
            Circle(SKETCH_32_R)
    extrude(amount=CUT_EXTRUDE_10_DEPTH, mode=Mode.SUBTRACT)


solid = part.part
